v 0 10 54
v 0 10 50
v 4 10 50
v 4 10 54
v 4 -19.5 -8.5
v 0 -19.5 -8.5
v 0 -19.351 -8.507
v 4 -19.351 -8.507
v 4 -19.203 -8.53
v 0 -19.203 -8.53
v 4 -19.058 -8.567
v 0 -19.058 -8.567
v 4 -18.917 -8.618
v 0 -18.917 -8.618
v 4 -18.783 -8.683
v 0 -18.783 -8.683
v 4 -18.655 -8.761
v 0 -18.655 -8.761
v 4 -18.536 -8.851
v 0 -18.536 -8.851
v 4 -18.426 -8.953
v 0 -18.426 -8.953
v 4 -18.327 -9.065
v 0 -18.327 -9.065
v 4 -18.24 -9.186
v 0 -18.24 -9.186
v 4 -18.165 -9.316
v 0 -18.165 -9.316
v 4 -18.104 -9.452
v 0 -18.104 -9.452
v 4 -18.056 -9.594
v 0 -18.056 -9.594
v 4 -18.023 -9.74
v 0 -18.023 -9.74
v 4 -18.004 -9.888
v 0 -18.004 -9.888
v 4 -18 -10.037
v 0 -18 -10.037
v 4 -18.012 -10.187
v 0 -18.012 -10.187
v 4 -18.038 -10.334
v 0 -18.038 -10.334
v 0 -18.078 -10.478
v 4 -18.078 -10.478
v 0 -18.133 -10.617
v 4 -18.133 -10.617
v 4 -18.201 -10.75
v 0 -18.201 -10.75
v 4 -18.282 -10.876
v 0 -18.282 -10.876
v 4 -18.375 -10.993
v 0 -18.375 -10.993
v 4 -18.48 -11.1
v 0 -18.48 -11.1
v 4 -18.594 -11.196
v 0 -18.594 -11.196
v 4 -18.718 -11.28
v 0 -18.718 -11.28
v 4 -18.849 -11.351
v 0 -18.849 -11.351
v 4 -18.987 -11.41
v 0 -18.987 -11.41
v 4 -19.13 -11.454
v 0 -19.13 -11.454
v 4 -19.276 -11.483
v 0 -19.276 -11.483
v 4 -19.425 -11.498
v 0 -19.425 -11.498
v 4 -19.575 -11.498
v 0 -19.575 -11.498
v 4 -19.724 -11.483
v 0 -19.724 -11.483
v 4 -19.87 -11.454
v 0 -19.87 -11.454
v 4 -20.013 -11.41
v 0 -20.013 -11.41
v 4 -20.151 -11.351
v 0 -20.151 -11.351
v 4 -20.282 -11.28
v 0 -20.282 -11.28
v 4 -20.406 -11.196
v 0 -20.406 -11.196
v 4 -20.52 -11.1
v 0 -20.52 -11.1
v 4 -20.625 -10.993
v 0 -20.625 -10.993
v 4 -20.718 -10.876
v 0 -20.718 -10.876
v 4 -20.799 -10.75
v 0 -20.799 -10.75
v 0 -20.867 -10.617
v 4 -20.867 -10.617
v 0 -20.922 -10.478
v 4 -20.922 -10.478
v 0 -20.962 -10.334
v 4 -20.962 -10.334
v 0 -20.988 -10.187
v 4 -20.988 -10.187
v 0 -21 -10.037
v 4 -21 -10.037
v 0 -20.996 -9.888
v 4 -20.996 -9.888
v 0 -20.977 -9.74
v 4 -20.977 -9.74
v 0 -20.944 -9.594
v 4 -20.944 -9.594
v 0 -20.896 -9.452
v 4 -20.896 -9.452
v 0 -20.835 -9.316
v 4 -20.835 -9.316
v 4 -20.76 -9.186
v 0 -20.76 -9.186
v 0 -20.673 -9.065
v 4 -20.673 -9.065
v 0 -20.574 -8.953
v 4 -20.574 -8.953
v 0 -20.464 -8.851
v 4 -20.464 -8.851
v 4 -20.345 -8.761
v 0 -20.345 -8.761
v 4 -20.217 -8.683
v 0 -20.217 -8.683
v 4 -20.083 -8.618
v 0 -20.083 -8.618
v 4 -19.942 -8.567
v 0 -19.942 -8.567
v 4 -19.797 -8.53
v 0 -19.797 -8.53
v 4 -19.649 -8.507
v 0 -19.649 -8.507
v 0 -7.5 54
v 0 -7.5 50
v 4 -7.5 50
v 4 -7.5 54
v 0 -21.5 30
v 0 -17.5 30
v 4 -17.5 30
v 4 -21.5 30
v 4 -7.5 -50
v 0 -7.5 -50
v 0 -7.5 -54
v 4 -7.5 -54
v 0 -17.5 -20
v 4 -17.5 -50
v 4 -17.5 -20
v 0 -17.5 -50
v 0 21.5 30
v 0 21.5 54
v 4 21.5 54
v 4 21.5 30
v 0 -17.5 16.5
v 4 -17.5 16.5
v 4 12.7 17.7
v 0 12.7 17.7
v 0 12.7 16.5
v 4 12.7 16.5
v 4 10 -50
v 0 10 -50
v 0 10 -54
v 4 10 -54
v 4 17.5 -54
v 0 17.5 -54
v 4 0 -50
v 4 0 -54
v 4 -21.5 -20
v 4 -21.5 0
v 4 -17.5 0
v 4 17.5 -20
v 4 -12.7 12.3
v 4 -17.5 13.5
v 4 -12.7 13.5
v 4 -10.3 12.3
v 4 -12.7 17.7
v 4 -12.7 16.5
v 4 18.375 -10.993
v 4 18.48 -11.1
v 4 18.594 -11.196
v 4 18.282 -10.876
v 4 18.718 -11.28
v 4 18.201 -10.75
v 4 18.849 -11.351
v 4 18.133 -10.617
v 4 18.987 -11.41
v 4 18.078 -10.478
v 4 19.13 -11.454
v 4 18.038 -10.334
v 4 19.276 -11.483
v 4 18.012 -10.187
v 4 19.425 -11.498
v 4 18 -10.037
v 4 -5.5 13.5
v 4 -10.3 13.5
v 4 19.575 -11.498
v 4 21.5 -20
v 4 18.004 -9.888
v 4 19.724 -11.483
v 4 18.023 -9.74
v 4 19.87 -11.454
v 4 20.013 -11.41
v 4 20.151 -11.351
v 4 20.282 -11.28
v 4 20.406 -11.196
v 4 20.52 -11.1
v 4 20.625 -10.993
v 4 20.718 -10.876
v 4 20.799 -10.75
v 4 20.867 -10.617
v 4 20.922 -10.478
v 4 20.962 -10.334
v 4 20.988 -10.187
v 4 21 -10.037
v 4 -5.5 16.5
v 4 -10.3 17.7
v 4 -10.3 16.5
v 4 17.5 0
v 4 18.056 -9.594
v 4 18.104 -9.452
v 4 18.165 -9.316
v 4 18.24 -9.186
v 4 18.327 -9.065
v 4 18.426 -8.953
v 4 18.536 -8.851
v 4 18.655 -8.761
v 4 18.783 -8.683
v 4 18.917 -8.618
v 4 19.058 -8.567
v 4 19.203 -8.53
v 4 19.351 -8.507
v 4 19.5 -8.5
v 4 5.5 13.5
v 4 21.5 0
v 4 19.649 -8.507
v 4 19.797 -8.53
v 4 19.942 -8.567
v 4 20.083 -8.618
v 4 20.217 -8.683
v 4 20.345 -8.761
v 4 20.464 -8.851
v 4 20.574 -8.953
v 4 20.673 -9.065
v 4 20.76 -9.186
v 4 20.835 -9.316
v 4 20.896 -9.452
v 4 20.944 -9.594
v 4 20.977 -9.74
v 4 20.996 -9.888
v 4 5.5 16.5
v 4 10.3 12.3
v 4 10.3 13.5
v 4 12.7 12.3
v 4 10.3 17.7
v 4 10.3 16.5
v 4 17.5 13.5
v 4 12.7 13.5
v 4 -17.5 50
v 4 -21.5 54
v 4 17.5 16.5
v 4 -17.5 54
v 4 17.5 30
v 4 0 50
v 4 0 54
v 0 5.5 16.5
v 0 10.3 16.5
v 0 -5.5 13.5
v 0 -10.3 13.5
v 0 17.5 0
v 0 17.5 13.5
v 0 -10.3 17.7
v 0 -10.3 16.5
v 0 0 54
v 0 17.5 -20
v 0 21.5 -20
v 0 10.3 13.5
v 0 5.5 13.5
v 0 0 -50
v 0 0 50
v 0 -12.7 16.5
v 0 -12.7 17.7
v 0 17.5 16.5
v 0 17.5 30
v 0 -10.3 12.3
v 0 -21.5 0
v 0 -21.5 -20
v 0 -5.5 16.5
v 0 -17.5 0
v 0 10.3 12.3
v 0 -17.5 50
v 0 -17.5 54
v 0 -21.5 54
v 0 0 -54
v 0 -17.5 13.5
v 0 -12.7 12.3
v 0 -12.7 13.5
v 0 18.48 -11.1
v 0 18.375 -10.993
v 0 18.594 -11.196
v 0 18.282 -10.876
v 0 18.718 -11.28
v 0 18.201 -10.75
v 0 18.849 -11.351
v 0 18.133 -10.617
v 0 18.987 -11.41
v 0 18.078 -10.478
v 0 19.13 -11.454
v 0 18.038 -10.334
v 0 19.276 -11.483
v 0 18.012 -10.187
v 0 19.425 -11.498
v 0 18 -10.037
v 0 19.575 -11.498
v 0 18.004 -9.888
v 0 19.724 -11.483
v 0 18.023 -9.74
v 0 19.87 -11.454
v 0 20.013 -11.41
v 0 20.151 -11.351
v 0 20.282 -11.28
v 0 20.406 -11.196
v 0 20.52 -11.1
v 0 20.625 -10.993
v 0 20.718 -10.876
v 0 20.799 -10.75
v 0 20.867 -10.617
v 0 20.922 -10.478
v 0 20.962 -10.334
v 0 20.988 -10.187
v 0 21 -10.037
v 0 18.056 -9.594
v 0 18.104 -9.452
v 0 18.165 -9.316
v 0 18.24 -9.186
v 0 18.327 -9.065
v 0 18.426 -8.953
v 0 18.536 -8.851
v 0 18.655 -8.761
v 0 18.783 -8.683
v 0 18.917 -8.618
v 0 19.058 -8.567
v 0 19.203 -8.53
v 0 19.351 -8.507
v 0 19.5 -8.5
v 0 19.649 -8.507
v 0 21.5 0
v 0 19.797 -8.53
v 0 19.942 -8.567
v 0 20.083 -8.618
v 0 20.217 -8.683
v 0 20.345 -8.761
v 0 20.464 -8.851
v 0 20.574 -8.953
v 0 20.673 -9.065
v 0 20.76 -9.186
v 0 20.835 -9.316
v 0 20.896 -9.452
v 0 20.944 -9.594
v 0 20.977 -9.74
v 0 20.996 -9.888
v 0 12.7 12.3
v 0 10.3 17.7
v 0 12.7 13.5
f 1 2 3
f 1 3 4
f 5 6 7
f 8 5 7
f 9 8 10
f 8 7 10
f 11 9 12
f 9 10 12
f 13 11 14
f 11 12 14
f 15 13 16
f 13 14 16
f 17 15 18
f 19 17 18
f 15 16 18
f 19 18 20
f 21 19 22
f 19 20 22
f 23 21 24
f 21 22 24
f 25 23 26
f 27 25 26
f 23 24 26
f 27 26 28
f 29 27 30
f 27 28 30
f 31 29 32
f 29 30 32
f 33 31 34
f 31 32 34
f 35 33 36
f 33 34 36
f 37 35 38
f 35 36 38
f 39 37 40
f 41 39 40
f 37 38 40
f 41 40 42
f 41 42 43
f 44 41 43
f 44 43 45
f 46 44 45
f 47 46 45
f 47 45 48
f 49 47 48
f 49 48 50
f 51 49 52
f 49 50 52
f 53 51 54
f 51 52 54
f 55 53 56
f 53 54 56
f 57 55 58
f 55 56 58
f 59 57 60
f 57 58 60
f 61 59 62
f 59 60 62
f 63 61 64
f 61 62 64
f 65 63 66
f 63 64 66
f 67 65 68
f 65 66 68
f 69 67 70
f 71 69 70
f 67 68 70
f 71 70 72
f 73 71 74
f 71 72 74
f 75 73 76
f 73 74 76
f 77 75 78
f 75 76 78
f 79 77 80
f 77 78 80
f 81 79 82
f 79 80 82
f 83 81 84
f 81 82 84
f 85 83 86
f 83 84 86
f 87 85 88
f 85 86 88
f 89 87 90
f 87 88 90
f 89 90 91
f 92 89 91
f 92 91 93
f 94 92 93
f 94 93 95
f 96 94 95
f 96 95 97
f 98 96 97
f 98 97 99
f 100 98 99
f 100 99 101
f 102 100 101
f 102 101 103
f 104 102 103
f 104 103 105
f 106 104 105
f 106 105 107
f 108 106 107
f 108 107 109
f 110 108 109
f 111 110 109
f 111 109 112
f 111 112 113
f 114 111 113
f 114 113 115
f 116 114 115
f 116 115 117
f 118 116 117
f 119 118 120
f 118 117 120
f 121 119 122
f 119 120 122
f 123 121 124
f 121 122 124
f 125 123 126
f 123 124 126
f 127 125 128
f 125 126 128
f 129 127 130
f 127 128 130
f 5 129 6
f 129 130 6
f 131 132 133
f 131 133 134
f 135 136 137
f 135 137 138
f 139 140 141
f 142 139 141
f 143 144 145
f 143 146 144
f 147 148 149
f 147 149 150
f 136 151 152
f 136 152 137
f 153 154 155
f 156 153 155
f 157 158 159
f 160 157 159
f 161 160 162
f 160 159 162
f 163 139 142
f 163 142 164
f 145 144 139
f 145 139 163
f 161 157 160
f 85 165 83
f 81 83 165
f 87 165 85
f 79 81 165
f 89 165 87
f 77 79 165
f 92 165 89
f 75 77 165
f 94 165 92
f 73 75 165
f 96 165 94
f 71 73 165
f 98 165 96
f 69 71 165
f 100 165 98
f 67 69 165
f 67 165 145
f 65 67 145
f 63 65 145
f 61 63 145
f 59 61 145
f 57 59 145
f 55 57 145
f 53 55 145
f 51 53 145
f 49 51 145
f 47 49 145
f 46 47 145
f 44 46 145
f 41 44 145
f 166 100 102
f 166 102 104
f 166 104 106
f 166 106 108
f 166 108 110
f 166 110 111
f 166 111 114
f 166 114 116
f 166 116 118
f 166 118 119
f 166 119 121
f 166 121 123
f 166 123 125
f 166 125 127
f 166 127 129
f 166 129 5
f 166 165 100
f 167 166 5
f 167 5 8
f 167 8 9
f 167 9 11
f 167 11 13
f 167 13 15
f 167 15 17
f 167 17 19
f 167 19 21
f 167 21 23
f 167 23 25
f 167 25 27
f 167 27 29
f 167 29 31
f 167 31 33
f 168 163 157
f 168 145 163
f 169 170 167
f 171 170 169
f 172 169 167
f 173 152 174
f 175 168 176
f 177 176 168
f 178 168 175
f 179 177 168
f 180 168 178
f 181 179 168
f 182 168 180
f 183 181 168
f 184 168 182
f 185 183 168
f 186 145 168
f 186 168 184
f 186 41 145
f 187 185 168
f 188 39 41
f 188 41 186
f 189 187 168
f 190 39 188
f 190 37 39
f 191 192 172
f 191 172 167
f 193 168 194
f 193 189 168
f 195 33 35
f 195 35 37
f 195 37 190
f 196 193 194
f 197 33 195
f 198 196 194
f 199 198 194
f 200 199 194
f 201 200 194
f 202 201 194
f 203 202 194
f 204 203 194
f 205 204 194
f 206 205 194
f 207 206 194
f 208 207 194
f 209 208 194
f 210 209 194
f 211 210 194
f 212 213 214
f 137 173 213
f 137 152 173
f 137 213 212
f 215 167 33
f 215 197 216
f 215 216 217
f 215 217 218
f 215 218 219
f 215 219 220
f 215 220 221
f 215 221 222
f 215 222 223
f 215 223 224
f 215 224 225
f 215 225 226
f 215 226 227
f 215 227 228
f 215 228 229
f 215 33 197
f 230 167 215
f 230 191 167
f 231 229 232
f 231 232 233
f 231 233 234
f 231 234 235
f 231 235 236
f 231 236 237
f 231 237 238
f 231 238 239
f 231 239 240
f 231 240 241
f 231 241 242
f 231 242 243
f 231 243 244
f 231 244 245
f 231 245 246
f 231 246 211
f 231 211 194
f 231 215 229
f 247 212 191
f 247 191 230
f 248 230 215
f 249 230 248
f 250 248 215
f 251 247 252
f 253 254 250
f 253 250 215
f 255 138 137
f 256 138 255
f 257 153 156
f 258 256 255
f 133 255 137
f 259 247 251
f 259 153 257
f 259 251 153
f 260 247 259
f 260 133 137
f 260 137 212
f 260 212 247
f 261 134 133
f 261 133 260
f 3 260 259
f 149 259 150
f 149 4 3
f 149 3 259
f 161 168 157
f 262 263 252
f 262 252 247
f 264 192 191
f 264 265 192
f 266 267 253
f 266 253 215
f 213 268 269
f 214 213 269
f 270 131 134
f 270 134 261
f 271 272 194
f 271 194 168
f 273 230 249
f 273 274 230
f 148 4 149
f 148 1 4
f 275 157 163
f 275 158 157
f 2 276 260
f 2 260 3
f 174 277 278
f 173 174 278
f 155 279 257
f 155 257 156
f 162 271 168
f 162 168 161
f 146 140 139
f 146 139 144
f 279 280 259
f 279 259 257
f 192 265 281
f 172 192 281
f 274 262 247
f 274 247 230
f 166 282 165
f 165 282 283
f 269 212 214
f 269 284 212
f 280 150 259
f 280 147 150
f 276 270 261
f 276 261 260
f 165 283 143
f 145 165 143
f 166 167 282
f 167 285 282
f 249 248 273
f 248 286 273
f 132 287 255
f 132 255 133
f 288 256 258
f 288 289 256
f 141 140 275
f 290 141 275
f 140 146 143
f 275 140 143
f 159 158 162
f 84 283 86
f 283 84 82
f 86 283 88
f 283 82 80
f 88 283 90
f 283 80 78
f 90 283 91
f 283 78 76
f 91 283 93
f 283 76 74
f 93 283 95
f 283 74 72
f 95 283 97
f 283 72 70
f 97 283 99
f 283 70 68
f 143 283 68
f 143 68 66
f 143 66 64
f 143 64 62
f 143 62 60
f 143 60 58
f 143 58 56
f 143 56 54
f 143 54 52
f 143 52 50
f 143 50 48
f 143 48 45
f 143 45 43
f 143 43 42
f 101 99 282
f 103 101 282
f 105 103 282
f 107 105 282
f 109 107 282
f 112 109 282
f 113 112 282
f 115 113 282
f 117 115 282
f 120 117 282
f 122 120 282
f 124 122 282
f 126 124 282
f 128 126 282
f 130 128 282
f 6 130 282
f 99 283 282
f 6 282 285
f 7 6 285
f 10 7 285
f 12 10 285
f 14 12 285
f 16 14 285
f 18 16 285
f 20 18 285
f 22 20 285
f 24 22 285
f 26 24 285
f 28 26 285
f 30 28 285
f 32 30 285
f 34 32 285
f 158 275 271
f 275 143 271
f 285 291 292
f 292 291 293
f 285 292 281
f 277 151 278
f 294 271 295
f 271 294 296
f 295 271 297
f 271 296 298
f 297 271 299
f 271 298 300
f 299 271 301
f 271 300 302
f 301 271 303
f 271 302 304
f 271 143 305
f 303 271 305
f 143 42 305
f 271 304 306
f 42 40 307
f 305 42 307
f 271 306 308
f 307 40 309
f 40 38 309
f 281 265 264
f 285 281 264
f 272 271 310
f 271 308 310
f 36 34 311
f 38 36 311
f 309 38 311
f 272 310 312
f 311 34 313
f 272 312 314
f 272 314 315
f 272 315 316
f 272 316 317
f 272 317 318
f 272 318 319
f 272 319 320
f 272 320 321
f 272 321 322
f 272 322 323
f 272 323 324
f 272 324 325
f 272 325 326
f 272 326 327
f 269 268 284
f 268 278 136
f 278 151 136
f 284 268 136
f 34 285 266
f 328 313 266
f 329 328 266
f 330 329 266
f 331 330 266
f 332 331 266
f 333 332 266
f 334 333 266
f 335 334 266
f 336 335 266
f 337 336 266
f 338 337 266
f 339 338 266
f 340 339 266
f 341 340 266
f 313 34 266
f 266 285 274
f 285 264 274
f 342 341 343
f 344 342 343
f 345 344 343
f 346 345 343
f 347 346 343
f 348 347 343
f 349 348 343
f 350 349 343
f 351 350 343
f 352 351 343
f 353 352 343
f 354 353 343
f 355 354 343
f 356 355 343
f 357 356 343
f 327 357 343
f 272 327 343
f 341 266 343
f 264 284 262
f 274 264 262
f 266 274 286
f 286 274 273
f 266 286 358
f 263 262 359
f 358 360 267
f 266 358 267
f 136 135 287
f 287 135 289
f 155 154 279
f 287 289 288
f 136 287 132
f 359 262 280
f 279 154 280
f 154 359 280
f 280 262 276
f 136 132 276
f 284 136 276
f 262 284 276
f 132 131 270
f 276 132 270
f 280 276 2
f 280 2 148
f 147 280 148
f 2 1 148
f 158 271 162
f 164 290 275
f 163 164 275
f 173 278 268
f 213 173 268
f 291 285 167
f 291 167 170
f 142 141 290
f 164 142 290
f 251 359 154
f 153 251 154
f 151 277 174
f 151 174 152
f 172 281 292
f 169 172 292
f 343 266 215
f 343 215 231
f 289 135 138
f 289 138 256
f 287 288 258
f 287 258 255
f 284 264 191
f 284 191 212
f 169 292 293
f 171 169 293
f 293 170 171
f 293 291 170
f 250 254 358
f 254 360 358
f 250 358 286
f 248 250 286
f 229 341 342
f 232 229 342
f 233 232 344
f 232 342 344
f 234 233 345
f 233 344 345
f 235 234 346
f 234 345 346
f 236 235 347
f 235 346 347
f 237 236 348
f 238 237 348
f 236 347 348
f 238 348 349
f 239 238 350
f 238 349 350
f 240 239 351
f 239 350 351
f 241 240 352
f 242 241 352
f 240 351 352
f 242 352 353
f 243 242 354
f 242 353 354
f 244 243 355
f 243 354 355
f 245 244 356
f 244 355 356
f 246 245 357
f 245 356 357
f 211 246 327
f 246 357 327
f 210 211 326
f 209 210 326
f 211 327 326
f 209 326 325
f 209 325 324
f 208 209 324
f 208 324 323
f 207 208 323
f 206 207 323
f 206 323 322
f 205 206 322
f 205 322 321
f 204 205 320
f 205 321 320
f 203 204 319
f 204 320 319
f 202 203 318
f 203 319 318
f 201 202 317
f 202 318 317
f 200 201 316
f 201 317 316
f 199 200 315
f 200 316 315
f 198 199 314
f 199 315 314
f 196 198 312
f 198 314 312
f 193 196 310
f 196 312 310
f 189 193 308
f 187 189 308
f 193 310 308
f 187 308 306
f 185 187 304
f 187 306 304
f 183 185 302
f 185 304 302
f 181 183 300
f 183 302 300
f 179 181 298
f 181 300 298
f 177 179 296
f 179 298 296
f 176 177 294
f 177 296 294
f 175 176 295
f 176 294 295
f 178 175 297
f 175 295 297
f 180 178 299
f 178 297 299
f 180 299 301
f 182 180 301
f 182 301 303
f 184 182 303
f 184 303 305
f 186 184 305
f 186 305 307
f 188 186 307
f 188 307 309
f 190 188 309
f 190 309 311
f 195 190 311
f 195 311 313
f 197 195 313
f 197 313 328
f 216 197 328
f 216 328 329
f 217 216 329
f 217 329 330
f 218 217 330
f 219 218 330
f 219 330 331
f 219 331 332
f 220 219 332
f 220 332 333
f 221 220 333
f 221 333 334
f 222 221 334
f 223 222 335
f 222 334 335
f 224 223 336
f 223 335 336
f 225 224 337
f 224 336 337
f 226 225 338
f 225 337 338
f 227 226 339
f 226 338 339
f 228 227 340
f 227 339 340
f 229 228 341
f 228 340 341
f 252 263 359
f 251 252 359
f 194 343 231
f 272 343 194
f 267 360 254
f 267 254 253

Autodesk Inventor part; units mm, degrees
ref_plane "YZ Plane" through (0, 0, 0) normal (1, 0, 0) x (0, 1, 0)
ref_plane "XZ Plane" through (0, 0, 0) normal (0, 1, 0) x (-1, 0, 0)
ref_plane "XY Plane" through (0, 0, 0) normal (0, 0, 1) x (1, 0, 0)
sketch "Sketch1" plane through (0, 0, 0) normal (1, 0, 0) x (0, 1, 0)
  line L0 (-17.5, 50) -> (17.5, 50)
  line L1 (17.5, 50) -> (17.5, -50)
  line L2 (17.5, -50) -> (-17.5, -50)
  line L3 (-17.5, -50) -> (-17.5, 50)
  line L4 (-17.5, 50) -> (17.5, -50) construction
  line L5 (17.5, 50) -> (-17.5, -50) construction
  line L6 (17.5, 50) -> (10, 50)
  line L7 (10, 50) -> (10, 54)
  line L8 (10, 54) -> (17.5, 54)
  line L9 (17.5, 54) -> (17.5, 50)
  line L10 (0, 50) -> (-7.5, 50)
  line L11 (-7.5, 50) -> (-7.5, 54)
  line L12 (-7.5, 54) -> (0, 54)
  line L13 (0, 54) -> (0, 50)
  line L14 (17.5, 0) -> (-17.5, 0) construction
  line L15 (0, 50) -> (0, -50) construction
  line L16 (17.5, -50) -> (10, -50)
  line L17 (10, -50) -> (10, -54)
  line L18 (10, -54) -> (17.5, -54)
  line L19 (17.5, -54) -> (17.5, -50)
  line L20 (0, -50) -> (-7.5, -50)
  line L21 (-7.5, -50) -> (-7.5, -54)
  line L22 (-7.5, -54) -> (0, -54)
  line L23 (0, -54) -> (0, -50)
  line L24 (17.5, 50) -> (21.5, 50)
  line L25 (21.5, 50) -> (21.5, 30)
  line L26 (21.5, 30) -> (17.5, 30)
  line L27 (17.5, 30) -> (17.5, 50)
  line L28 (17.5, 0) -> (21.5, 0)
  line L29 (21.5, 0) -> (21.5, -20)
  line L30 (21.5, -20) -> (17.5, -20)
  line L31 (17.5, -20) -> (17.5, 0)
  line L32 (-17.5, 0) -> (-21.5, 0)
  line L33 (-21.5, 0) -> (-21.5, -20)
  line L34 (-21.5, -20) -> (-17.5, -20)
  line L35 (-17.5, -20) -> (-17.5, 0)
  line L36 (17.5, 50) -> (21.5, 50)
  line L37 (21.5, 50) -> (21.5, 54)
  line L38 (21.5, 54) -> (17.5, 54)
  line L39 (17.5, 54) -> (17.5, 50)
  line L40 (-17.5, 30) -> (-21.5, 30)
  line L41 (-21.5, 30) -> (-21.5, 54)
  line L42 (-21.5, 54) -> (-17.5, 54)
  line L43 (-17.5, 54) -> (-17.5, 30)
  point P0 (0, 0)
  point P1 (0, 52)
  point P2 (0, -52)
  point P3 (-17.5, -20)
  point P4 (-7.5, -50)
  point P5 (10, -50)
  point P6 (17.5, -20)
  point P7 (17.5, 30)
  point P8 (10, 50)
  point P9 (-7.5, 50)
  point P10 (-19.5, 0)
  point P11 (-19.5, 30)
  dimension "d0" = 35
  dimension "d2" = 7.5
  dimension "d3" = 4
  dimension "d4" = 7.5
  dimension "d5" = 4
  dimension "d6" = 10
  dimension "d7" = 4
  dimension "d8" = 20
  dimension "d9" = 4
  dimension "d10" = 20
  dimension "d13" = 4
  dimension "d14" = 20
  dimension "d17" = 4
  dimension "d18" = 24
  dimension "d19" = 30
extrude "Extrusion1" add sketch "Sketch1" along normal blind 4
sketch "Sketch2" plane through (0, 0, 0) normal (-1, 0, 0) x (0, 0, 1)
  line L0 (-8.5, 17.5) -> (-11.5, 17.5) construction
  line L1 (-8.5, 21.5) -> (-8.5, 17.5) construction
  line L2 (-11.5, 21.5) -> (-8.5, 21.5) construction
  line L3 (-11.5, 21.5) -> (-11.5, 17.5) construction
  line L4 (13.5, 21.5) -> (16.5, 21.5) projected
  line L5 (-11.5, 21.5) -> (-8.5, 17.5) construction
  circle A0 centre (-10, 19.5) radius 1.5
  line L6 (13.5, 17.5) -> (16.5, 17.5)
  line L7 (16.5, 17.5) -> (16.5, 5.5)
  line L8 (16.5, 5.5) -> (13.5, 5.5)
  line L9 (13.5, 5.5) -> (13.5, 17.5)
  line L10 (0, 17.5) -> (30, 17.5) projected
  line L11 (12.3, 10.3) -> (17.7, 10.3)
  line L12 (17.7, 10.3) -> (17.7, 12.7)
  line L13 (17.7, 12.7) -> (12.3, 12.7)
  line L14 (12.3, 12.7) -> (12.3, 10.3)
  line L15 (13.5, -5.5) -> (16.5, -5.5)
  line L16 (16.5, -5.5) -> (16.5, -17.5)
  line L17 (16.5, -17.5) -> (13.5, -17.5)
  line L18 (13.5, -17.5) -> (13.5, -5.5)
  line L19 (12.3, -12.7) -> (17.7, -12.7)
  line L20 (17.7, -12.7) -> (17.7, -10.3)
  line L21 (17.7, -10.3) -> (12.3, -10.3)
  line L22 (12.3, -10.3) -> (12.3, -12.7)
  line L23 (30, -17.5) -> (0, -17.5) projected
  line L24 (16.5, -21.5) -> (13.5, -21.5) projected
  line L25 (30, 21.5) -> (54, 21.5) construction
  line L26 (54, 21.5) -> (54, 10) construction
  line L27 (54, 10) -> (50, 10) construction
  line L28 (50, 10) -> (50, 0) construction
  line L29 (50, 0) -> (54, 0) construction
  line L30 (54, 0) -> (54, -7.5) construction
  line L31 (54, -7.5) -> (50, -7.5) construction
  line L32 (50, -7.5) -> (50, -17.5) construction
  line L33 (50, -17.5) -> (54, -17.5) construction
  line L34 (54, -17.5) -> (54, -21.5) construction
  line L35 (54, -21.5) -> (30, -21.5) construction
  line L36 (30, -21.5) -> (30, -17.5) construction
  line L37 (30, -17.5) -> (0, -17.5) construction
  line L38 (0, -17.5) -> (0, -21.5) construction
  line L39 (0, -21.5) -> (-20, -21.5) construction
  line L40 (-20, -21.5) -> (-20, -17.5) construction
  line L41 (-20, -17.5) -> (-50, -17.5) construction
  line L42 (-50, -17.5) -> (-50, -7.5) construction
  line L43 (-50, -7.5) -> (-54, -7.5) construction
  line L44 (-54, -7.5) -> (-54, 0) construction
  line L45 (-54, 0) -> (-50, 0) construction
  line L46 (-50, 0) -> (-50, 10) construction
  line L47 (-50, 10) -> (-54, 10) construction
  line L48 (-54, 10) -> (-54, 17.5) construction
  line L49 (-54, 17.5) -> (-20, 17.5) construction
  line L50 (-20, 17.5) -> (-20, 21.5) construction
  line L51 (-20, 21.5) -> (0, 21.5) construction
  line L52 (0, 21.5) -> (0, 17.5) construction
  line L53 (0, 17.5) -> (30, 17.5) construction
  line L54 (30, 17.5) -> (30, 21.5) construction
  line L55 (-11.5, -17.5) -> (-8.5, -17.5) construction
  line L56 (-11.5, -21.5) -> (-11.5, -17.5) construction
  line L57 (-8.5, -21.5) -> (-11.5, -21.5) construction
  line L58 (-8.5, -21.5) -> (-8.5, -17.5) construction
  line L59 (-11.5, -17.5) -> (-8.5, -21.5) construction
  circle A1 centre (-10, -19.5) radius 1.5
  point P0 (0, 0)
  point P1 (15, 17.5)
  point P2 (15, 21.5)
  point P3 (15, 12.7)
  point P4 (17.7, 11.5)
  point P5 (16.5, 11.5)
  point P6 (15, -5.5)
  point P7 (15, -10.3)
  point P8 (17.7, -11.5)
  point P9 (16.5, -11.5)
  point P10 (15, -21.5)
  point P11 (16.5, 12.7)
  point P12 (13.5, 12.7)
  point P13 (13.5, 10.3)
  point P14 (16.5, 10.3)
  point P15 (13.5, -10.3)
  point P16 (13.5, -12.7)
  point P17 (16.5, -12.7)
  point P18 (16.5, -10.3)
  dimension "d20" = 3
  dimension "d21" = 3
  dimension "d22" = 12
  dimension "d23" = 5.4
  dimension "d24" = 2.4
  dimension "d25" = 3
  dimension "d26" = 12
  dimension "d27" = 5.4
  dimension "d28" = 2.4
  dimension "d31" = 3
extrude "Extrusion2" cut sketch "Sketch2" against normal up to next
properties part number "FloorButtonHolder_Side_V1" material "MDF Medium Density Fiberboard"
